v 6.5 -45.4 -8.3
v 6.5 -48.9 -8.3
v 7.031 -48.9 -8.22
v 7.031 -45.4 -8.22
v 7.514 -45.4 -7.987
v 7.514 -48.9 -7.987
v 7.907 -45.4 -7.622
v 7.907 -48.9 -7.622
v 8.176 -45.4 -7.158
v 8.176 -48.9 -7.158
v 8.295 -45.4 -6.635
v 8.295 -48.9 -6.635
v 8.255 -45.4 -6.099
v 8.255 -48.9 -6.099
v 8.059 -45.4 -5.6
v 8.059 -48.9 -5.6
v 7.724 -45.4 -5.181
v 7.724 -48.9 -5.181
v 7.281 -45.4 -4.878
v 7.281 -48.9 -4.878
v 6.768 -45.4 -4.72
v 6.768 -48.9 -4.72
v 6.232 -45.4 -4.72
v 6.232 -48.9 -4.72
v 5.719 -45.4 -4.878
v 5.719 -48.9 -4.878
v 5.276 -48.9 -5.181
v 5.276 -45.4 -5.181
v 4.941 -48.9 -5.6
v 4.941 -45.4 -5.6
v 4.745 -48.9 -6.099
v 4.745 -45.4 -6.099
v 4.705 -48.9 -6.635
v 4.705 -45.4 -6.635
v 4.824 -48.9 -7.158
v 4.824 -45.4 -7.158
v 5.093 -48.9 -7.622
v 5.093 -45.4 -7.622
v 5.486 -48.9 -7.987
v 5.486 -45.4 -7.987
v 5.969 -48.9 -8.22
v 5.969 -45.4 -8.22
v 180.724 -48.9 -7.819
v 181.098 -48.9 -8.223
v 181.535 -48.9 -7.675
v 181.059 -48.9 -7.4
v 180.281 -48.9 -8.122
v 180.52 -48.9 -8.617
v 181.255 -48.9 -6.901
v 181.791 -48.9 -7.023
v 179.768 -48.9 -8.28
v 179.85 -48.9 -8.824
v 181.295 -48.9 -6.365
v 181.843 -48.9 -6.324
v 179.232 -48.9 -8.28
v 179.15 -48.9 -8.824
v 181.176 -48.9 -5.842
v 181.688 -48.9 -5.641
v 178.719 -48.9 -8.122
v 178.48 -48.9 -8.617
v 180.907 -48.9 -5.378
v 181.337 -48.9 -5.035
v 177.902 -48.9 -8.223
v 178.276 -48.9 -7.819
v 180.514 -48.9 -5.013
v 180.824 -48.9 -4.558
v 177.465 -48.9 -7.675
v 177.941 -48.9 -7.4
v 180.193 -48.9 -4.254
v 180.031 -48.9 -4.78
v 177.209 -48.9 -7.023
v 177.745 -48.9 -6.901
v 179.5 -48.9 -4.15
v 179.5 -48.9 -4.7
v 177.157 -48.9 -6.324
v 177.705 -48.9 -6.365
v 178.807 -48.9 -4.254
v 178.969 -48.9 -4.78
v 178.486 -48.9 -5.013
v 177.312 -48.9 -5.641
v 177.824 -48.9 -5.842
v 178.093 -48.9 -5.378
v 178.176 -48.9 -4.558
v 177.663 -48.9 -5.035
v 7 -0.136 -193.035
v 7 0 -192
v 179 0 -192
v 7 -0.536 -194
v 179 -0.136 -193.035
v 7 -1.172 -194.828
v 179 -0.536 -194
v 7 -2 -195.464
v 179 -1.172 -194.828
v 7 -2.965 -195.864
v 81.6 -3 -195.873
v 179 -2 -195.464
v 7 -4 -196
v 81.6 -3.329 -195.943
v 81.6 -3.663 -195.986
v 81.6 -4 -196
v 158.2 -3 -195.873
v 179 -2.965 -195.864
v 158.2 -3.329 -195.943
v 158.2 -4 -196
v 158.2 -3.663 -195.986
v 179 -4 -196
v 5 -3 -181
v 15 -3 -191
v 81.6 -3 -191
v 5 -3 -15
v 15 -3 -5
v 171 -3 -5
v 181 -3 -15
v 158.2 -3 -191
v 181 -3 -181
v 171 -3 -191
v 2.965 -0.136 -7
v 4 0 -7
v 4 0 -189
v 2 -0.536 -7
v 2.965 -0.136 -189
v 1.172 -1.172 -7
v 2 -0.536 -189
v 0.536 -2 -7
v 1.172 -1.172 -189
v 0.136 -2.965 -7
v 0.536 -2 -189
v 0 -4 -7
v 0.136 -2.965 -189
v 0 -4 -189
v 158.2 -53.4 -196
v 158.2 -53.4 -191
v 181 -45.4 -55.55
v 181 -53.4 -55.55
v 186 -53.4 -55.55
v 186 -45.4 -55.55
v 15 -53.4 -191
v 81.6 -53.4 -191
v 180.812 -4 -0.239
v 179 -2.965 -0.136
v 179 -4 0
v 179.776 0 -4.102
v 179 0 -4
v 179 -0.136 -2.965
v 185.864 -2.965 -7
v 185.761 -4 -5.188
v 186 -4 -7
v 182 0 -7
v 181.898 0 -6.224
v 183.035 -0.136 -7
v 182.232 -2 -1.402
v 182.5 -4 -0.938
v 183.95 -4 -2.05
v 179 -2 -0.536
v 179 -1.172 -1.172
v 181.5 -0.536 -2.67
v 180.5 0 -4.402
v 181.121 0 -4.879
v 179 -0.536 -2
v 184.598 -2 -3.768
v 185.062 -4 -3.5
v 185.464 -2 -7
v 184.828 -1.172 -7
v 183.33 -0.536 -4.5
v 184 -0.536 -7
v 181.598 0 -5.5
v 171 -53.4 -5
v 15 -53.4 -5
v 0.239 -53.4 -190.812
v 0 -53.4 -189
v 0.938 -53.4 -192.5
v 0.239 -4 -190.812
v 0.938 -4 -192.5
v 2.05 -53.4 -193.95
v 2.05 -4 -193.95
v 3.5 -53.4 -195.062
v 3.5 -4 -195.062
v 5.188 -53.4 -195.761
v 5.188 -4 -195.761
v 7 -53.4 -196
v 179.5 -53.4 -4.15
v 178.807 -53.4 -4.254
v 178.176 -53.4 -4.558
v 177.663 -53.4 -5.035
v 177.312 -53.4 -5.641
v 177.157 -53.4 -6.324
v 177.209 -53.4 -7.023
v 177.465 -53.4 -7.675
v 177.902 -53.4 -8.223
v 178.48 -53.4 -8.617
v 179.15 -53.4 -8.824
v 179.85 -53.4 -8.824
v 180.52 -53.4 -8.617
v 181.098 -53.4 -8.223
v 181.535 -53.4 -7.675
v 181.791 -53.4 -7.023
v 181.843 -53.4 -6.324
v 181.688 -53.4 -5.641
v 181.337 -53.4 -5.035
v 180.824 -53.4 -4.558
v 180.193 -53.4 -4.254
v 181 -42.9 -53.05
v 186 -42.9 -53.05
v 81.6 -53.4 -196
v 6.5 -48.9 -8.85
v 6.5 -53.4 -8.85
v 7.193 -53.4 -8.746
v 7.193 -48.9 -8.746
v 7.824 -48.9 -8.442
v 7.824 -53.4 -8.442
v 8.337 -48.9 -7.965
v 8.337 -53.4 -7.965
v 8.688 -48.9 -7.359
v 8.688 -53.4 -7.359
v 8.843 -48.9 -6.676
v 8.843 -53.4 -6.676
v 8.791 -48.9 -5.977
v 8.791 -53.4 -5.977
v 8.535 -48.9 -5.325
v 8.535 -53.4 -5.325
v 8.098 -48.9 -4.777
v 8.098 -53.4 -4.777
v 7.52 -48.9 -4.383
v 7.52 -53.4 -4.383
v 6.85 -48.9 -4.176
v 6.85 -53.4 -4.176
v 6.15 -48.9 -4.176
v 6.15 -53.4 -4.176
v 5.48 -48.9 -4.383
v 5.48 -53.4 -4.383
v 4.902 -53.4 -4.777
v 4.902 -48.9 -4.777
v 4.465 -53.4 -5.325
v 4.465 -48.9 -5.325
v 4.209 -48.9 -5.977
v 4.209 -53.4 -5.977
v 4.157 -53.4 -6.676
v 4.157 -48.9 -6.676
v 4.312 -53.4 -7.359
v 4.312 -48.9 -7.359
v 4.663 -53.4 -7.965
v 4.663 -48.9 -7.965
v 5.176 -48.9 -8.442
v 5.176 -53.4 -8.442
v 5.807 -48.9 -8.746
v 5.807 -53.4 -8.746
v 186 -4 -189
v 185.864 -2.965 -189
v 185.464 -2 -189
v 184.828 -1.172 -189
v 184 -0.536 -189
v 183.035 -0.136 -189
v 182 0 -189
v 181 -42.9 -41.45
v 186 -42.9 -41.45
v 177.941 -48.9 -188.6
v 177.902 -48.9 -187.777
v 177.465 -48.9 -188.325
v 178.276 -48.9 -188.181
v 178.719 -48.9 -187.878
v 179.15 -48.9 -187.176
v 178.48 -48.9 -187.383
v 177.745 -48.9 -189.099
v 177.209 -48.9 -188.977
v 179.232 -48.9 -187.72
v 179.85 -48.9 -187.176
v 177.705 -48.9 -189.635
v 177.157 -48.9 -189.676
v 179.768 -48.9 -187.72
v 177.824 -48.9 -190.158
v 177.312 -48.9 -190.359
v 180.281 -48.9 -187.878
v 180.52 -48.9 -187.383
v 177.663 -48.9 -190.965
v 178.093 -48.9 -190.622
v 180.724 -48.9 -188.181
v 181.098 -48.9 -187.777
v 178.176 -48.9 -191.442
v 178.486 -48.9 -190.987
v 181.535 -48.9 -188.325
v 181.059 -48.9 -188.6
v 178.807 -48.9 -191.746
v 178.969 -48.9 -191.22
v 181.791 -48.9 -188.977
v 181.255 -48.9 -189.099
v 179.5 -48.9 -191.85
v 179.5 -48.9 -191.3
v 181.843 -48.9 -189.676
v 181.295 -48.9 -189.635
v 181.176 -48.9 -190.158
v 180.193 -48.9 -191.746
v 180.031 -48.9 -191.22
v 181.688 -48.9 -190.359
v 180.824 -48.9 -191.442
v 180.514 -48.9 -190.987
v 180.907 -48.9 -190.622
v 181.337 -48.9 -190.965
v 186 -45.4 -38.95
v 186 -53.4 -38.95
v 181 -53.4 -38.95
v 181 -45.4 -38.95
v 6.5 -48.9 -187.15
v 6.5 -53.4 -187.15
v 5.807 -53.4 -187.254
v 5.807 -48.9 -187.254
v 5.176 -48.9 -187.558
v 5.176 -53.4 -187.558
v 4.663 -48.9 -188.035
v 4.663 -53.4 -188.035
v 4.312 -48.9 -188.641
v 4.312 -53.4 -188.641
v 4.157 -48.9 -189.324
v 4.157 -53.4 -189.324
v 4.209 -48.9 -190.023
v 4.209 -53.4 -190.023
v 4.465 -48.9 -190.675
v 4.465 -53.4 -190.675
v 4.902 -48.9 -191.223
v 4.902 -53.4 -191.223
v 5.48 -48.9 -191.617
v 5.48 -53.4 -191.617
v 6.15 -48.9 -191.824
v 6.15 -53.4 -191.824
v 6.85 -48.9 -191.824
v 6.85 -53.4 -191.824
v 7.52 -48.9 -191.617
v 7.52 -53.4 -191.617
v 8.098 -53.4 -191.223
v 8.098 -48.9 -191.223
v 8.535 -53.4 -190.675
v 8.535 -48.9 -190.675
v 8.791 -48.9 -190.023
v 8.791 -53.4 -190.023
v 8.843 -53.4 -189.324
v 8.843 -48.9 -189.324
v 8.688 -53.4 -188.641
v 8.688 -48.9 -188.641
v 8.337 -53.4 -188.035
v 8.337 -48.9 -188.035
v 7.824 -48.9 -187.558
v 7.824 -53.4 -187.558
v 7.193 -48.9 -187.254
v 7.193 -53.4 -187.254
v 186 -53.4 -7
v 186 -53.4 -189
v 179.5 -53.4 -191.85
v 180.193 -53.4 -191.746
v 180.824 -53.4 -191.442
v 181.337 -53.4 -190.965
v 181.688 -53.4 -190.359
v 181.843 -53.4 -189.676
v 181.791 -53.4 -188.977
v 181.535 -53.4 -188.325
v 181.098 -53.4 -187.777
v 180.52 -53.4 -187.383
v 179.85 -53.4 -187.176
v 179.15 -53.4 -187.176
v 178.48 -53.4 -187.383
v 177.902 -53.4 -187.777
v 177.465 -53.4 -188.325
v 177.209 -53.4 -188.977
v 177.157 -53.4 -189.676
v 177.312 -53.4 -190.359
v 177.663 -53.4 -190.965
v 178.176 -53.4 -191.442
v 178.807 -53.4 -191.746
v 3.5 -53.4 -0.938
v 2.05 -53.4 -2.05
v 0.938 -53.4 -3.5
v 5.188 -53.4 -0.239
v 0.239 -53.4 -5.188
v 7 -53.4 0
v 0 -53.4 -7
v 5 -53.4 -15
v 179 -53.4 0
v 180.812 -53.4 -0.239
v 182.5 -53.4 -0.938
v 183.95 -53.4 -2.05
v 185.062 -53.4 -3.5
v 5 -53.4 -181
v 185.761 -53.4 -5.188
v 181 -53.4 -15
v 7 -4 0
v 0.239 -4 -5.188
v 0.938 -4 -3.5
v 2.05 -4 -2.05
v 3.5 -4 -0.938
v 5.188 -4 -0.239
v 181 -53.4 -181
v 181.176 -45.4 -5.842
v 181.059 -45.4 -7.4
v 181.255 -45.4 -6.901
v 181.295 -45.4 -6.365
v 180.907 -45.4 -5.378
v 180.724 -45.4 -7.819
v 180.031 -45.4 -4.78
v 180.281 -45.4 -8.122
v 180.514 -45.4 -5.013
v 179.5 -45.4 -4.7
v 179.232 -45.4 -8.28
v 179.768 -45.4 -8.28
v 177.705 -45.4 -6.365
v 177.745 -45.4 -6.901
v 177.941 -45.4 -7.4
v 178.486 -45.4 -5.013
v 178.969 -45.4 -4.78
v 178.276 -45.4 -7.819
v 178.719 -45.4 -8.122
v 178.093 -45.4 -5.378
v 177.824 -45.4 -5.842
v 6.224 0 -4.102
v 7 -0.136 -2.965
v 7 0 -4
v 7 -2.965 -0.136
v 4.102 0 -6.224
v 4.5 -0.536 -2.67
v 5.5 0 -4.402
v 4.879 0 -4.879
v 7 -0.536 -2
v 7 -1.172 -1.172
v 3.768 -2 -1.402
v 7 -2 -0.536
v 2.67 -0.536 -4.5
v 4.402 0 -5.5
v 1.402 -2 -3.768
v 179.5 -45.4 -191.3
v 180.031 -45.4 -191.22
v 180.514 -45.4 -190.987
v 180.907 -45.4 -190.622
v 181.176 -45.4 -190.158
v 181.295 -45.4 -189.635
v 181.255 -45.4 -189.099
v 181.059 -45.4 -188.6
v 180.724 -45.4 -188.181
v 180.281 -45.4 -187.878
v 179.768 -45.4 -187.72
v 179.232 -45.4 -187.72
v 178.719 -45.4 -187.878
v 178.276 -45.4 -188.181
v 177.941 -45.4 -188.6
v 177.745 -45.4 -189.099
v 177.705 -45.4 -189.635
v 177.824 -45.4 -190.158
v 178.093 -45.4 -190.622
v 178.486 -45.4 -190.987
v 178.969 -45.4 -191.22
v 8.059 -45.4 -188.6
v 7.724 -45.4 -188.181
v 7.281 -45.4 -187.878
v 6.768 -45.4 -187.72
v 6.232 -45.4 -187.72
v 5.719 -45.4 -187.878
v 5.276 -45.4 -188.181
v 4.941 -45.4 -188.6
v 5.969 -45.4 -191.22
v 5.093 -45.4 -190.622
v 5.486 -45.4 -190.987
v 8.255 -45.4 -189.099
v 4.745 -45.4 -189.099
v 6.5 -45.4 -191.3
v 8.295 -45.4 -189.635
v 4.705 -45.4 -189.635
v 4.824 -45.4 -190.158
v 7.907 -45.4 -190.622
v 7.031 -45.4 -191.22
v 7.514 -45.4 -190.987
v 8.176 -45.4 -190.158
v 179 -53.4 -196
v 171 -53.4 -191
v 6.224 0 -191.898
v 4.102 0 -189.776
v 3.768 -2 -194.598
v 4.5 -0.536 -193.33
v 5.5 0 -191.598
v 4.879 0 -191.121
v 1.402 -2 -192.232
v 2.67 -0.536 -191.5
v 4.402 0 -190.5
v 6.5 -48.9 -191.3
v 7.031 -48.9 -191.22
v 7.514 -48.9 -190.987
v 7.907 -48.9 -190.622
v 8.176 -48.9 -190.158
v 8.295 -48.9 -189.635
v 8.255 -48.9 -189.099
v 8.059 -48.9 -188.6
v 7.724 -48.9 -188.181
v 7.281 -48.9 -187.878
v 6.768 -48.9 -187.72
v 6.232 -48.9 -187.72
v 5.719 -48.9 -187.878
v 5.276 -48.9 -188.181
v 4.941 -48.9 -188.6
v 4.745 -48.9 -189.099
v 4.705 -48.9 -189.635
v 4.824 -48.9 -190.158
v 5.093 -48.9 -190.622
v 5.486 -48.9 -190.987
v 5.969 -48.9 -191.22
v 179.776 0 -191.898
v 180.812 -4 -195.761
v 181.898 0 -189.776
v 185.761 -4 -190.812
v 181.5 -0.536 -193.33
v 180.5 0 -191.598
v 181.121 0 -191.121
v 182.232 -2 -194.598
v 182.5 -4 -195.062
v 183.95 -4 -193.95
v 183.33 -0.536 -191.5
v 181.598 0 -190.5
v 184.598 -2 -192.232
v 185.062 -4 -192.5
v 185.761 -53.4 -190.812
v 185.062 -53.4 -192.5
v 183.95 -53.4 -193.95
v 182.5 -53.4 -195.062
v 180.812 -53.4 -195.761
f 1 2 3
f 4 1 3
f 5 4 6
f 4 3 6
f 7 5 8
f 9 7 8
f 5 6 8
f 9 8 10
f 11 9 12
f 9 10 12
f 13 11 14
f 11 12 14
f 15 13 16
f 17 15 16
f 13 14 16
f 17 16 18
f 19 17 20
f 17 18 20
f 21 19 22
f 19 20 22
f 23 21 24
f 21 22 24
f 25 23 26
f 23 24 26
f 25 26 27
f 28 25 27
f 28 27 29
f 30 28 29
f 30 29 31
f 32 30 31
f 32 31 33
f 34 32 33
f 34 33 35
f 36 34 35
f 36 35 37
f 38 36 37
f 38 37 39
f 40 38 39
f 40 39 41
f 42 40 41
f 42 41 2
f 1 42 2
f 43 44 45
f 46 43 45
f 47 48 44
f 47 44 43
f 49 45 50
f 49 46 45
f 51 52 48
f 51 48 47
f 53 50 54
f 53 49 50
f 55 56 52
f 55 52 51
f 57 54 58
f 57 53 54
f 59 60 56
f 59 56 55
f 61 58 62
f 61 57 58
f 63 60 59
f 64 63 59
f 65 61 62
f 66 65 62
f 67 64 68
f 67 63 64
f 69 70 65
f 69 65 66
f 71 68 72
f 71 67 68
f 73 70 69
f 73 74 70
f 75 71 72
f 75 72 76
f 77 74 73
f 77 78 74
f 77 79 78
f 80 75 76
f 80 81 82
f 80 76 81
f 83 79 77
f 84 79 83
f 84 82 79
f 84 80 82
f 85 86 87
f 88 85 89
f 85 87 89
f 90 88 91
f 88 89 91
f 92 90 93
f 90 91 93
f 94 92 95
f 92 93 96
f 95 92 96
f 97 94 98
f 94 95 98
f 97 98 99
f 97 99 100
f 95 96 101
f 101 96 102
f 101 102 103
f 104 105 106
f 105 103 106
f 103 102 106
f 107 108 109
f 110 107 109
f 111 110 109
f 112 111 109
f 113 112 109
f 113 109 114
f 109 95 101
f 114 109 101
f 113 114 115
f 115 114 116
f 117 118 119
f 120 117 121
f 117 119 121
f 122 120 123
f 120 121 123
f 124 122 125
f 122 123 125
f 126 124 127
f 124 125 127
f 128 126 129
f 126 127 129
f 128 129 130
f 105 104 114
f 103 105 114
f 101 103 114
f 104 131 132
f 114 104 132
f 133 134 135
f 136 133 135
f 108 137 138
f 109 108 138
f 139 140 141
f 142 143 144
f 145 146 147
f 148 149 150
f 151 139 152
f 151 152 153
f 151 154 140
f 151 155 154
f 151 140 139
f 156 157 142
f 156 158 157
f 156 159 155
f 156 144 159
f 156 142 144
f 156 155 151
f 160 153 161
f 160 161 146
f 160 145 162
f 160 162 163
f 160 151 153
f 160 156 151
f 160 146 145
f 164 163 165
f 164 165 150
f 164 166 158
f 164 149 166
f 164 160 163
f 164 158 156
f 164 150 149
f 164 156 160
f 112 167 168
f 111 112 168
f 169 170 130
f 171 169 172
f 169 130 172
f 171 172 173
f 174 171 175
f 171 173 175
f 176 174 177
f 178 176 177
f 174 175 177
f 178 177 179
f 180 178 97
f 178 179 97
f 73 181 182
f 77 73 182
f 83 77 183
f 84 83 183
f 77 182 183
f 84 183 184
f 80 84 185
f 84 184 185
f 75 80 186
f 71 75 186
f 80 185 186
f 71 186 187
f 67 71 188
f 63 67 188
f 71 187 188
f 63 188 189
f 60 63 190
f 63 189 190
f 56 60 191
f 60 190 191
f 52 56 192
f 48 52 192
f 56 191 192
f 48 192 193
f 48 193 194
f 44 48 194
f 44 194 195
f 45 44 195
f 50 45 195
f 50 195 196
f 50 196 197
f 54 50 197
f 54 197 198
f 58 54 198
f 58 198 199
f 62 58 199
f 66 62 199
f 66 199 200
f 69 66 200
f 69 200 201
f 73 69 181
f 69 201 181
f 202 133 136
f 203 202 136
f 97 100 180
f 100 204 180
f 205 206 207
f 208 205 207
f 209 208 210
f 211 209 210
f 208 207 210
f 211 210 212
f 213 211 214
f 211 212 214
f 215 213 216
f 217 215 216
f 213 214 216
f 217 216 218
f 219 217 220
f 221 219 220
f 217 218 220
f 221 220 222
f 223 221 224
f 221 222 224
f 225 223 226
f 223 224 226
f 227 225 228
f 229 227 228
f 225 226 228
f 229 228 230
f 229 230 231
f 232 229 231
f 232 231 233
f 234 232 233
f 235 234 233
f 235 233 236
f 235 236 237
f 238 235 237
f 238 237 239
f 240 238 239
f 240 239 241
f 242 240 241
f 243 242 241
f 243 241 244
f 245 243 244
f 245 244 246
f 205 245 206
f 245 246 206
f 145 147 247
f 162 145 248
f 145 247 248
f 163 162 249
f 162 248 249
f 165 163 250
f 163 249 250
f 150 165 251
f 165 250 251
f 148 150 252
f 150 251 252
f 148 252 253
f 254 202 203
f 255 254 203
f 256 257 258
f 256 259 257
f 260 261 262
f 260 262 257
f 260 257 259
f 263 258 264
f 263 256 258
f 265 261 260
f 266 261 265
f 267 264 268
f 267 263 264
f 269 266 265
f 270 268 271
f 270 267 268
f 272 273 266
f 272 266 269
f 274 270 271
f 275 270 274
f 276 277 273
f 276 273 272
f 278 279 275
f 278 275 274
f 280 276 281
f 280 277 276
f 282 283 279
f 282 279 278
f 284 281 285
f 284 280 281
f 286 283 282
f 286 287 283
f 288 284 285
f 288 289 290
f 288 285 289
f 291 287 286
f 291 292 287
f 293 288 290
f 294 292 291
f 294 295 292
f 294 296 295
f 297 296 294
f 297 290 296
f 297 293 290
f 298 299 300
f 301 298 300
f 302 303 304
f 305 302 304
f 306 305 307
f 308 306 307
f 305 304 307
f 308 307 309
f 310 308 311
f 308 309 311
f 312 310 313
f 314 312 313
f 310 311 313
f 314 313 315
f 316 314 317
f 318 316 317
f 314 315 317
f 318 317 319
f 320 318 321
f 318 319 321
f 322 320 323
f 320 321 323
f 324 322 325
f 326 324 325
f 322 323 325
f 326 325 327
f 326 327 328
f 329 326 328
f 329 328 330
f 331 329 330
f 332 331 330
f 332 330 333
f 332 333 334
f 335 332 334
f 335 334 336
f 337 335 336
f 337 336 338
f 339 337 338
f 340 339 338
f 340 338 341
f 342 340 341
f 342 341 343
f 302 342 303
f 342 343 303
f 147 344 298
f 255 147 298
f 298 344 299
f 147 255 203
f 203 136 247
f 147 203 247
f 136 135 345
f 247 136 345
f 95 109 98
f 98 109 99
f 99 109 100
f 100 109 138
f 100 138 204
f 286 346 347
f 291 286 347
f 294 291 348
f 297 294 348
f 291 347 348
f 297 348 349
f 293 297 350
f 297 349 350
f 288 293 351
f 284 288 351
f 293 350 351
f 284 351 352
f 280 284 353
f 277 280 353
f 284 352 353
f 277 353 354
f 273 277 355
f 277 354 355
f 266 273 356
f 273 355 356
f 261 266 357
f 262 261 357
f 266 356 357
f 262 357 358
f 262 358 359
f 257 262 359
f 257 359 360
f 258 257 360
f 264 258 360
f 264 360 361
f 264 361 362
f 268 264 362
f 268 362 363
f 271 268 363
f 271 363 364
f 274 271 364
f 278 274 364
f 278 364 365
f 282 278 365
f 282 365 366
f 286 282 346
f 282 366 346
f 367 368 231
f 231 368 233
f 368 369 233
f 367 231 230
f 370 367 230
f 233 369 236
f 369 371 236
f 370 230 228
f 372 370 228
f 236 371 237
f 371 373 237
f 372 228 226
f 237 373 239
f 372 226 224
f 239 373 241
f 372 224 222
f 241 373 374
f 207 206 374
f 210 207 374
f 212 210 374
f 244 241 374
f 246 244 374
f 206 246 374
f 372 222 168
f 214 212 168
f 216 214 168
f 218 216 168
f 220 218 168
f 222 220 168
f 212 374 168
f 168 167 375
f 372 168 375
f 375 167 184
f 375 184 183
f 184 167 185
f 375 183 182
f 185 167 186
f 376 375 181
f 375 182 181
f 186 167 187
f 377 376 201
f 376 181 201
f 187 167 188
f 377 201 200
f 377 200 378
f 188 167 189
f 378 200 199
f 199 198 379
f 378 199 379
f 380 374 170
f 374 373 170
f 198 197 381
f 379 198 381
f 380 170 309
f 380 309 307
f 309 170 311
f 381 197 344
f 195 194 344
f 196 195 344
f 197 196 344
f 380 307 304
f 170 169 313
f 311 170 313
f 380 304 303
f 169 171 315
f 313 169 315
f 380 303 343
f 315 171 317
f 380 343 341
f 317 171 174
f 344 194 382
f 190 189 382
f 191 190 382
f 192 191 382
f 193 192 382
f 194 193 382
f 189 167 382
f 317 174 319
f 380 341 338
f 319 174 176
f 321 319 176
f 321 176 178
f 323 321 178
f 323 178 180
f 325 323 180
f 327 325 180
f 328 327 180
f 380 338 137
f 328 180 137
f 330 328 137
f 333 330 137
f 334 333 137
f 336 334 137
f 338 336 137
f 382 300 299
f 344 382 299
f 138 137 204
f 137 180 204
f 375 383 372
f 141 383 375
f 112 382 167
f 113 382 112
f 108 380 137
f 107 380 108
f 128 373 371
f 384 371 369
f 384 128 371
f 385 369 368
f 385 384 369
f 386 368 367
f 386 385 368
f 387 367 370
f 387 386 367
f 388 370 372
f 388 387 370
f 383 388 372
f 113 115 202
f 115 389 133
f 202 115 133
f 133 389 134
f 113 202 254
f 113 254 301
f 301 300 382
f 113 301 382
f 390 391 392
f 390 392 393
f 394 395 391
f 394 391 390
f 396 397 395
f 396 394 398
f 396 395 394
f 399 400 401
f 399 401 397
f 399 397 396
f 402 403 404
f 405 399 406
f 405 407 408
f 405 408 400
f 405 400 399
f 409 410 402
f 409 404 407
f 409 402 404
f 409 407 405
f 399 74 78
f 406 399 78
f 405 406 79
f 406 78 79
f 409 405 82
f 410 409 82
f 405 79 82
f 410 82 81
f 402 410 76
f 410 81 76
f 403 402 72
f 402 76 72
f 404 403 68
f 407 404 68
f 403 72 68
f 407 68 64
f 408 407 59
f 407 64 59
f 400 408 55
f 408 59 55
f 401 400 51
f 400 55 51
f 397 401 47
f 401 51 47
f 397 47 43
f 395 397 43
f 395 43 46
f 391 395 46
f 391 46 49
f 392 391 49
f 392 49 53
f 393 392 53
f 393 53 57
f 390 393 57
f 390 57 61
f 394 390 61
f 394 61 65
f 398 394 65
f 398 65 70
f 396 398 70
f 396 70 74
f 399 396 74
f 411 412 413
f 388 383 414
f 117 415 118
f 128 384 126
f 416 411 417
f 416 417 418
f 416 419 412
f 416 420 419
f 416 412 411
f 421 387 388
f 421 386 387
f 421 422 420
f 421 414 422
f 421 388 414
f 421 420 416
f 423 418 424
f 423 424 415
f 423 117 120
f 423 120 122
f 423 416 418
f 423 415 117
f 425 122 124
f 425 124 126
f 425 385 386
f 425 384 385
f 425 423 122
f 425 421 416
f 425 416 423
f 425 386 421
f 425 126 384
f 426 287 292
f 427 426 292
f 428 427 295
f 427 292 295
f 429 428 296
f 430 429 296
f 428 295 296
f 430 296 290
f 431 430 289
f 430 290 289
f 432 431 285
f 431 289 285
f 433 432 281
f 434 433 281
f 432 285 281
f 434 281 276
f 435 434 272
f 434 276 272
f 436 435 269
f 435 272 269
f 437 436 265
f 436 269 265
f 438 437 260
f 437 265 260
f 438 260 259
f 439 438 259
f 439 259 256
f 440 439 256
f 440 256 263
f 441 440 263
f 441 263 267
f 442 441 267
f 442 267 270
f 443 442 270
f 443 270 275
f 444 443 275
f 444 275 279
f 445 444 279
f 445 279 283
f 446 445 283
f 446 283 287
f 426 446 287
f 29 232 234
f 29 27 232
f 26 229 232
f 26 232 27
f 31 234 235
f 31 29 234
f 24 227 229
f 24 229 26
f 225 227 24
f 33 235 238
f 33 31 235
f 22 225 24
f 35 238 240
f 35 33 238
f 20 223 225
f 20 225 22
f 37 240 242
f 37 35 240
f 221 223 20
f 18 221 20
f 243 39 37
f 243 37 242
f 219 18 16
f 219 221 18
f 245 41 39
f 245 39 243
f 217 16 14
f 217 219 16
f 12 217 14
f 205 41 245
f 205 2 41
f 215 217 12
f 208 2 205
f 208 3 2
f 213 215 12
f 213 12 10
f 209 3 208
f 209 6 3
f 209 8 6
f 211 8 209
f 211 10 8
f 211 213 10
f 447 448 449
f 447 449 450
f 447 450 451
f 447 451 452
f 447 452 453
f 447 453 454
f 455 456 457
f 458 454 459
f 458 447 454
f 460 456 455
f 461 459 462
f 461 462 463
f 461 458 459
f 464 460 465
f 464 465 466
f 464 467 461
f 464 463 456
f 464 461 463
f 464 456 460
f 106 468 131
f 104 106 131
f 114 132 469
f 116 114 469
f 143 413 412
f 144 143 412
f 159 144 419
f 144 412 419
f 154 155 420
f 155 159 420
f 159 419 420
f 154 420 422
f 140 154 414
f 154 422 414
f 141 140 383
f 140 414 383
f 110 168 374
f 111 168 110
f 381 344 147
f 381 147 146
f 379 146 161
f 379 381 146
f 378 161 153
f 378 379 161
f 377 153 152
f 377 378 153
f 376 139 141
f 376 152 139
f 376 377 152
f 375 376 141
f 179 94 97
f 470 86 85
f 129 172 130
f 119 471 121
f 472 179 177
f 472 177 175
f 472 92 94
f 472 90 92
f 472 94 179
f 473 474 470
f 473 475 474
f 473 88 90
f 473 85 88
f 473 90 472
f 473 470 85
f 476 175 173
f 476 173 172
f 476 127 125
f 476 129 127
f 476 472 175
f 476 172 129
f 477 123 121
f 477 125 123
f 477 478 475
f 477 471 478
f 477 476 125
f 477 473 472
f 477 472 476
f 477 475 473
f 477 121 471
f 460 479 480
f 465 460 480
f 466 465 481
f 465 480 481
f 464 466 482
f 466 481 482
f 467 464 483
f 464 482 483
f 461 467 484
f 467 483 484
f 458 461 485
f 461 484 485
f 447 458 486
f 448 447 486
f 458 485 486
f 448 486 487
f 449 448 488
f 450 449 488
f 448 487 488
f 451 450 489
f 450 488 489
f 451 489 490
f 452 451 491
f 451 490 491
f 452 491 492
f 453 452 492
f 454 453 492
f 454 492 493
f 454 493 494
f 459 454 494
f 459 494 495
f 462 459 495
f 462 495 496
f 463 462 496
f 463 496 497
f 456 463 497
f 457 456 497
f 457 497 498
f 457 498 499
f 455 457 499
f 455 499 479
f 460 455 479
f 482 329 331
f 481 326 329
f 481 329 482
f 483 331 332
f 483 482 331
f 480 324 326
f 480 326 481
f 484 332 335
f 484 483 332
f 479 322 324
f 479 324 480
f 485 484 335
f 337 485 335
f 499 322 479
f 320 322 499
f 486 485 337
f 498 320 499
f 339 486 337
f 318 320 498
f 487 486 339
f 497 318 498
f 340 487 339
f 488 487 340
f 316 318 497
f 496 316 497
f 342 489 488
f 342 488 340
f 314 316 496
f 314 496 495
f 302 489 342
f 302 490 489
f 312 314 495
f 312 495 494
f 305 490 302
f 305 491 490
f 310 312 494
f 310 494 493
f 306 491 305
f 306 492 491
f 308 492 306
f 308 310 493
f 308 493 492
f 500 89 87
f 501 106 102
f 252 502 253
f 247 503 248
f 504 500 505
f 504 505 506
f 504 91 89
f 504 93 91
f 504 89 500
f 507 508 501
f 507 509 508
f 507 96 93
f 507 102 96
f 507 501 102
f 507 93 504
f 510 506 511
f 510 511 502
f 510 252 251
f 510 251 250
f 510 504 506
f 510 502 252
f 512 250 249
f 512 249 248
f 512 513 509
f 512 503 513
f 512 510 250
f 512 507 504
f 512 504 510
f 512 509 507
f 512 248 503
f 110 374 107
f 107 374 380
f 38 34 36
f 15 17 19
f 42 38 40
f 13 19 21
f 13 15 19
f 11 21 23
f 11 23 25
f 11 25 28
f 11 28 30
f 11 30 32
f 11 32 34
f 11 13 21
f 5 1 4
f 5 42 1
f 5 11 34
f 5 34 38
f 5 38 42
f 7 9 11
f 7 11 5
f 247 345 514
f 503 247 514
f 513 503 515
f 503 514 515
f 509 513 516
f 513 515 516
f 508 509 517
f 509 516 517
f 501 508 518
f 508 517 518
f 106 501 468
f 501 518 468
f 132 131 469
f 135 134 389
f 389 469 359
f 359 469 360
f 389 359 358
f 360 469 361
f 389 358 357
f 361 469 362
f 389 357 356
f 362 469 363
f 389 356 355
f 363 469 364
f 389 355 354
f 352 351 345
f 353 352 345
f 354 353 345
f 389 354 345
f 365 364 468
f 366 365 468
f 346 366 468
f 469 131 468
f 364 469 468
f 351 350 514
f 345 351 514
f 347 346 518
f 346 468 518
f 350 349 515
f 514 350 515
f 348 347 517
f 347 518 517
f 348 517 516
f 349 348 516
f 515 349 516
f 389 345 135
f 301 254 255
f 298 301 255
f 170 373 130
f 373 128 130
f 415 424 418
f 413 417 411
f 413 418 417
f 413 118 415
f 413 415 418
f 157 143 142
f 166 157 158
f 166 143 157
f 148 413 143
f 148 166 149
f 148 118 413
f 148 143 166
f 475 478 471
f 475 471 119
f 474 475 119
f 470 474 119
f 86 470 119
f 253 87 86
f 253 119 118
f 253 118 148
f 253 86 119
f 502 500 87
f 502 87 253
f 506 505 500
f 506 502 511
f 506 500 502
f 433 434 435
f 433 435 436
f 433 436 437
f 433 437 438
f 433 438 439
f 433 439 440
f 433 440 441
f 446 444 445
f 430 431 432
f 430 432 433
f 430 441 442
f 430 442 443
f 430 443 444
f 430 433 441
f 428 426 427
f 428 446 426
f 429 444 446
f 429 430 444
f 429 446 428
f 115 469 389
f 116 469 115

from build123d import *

# Parameters (mm, degrees)
SKETCH1_W           = 186
SKETCH1_H           = 196
BOSS_EXTRUDE1_DEPTH = 3
BOSS_EXTRUDE2_START = -53.4
BOSS_EXTRUDE2_DEPTH = 50.4
CHAMFER1_SIZE       = 10
SKETCH1_4_W         = 5
SKETCH1_4_H         = 0.8
SKETCH1_4_H_2       = 15
BOSS_EXTRUDE3_DEPTH = 42.9
CHAMFER2_SIZE       = 2.5
SKETCH2_R           = 2.35
SKETCH2_R_2         = 1.8
CUT_EXTRUDE2_DEPTH  = 4.5
SKETCH2_3_R         = 1.8
CUT_EXTRUDE3_DEPTH  = 8
FILLET1_R           = 7
FILLET2_R           = 4


with BuildPart() as part:
    # Sketch1 → Boss-Extrude1 (new body)
    with BuildSketch(Plane(origin=(0, 0, 0), x_dir=(1, 0, 0), z_dir=(0, 1, 0))):
        with Locations((93, 98)):
            Rectangle(SKETCH1_W, SKETCH1_H)
    extrude(amount=-BOSS_EXTRUDE1_DEPTH)

    # Sketch1<3> → Boss-Extrude2 (add)
    with BuildSketch(Plane(origin=(0, 0, 0), x_dir=(1, 0, 0), z_dir=(0, 1, 0)).offset(BOSS_EXTRUDE2_START)):
        Polygon((186, 196), (158.2, 196), (158.2, 191), (181, 191), (181, 55.55), (186, 55.55), align=None)
        Polygon((81.6, 191), (81.6, 196), (0, 196), (0, 0), (186, 0), (186, 38.95), (181, 38.95), (181, 5), (5, 5), (5, 191), align=None)
    extrude(amount=BOSS_EXTRUDE2_DEPTH)

    # Chamfer1
    chamfer1_edges = [part.edges().sort_by_distance(p)[0] for p in [
        (5, -28.2, -191),
        (5, -28.2, -5),
        (181, -28.2, -5),
        (181, -28.2, -191),
    ]]
    chamfer(chamfer1_edges, length=CHAMFER1_SIZE)

    # Sketch1<4> → Boss-Extrude3 (add)
    with BuildSketch(Plane(origin=(0, 0, 0), x_dir=(1, 0, 0), z_dir=(0, 1, 0))):
        with Locations((183.5, 55.15)):
            Rectangle(SKETCH1_4_W, SKETCH1_4_H)
        with Locations((183.5, 47.25)):
            Rectangle(SKETCH1_4_W, SKETCH1_4_H_2)
        with Locations((183.5, 39.35)):
            Rectangle(SKETCH1_4_W, SKETCH1_4_H)
    extrude(amount=-BOSS_EXTRUDE3_DEPTH)

    # Chamfer2
    chamfer2_edges = [part.edges().sort_by_distance(p)[0] for p in [
        (183.5, -42.9, -55.55),
        (183.5, -42.9, -38.95),
    ]]
    chamfer(chamfer2_edges, length=CHAMFER2_SIZE)

    # Sketch2 → Cut-Extrude2 (cut)
    # profile 1 of 4: a face of its own
    with BuildSketch(Plane.XZ.offset(53.4)):
        with Locations(Location((6.5, -6.5, 0), (0, 0, 270))):
            Circle(SKETCH2_R)
        with Locations(Location((6.5, -6.5, 0), (0, 0, 270))):
            Circle(SKETCH2_R_2, mode=Mode.SUBTRACT)
    # profile 2 of 4: a face of its own
    with BuildSketch(Plane.XZ.offset(53.4)):
        with Locations(Location((179.5, -6.5, 0), (0, 0, 90))):
            Circle(SKETCH2_R)
        with Locations(Location((179.5, -6.5, 0), (0, 0, 90))):
            Circle(SKETCH2_R_2, mode=Mode.SUBTRACT)
    # profile 3 of 4: a face of its own
    with BuildSketch(Plane.XZ.offset(53.4)):
        with Locations(Location((179.5, -189.5, 0), (0, 0, 270))):
            Circle(SKETCH2_R)
        with Locations(Location((179.5, -189.5, 0), (0, 0, 270))):
            Circle(SKETCH2_R_2, mode=Mode.SUBTRACT)
    # profile 4 of 4: a face of its own
    with BuildSketch(Plane.XZ.offset(53.4)):
        with Locations(Location((6.5, -189.5, 0), (0, 0, 90))):
            Circle(SKETCH2_R)
        with Locations(Location((6.5, -189.5, 0), (0, 0, 90))):
            Circle(SKETCH2_R_2, mode=Mode.SUBTRACT)
    extrude(amount=-CUT_EXTRUDE2_DEPTH, mode=Mode.SUBTRACT)

    # Sketch2<3> → Cut-Extrude3 (cut)
    with BuildSketch(Plane.XZ.offset(53.4)):
        with Locations(Location((6.5, -6.5, 0), (0, 0, 270))):
            Circle(SKETCH2_3_R)
        with Locations(Location((6.5, -189.5, 0), (0, 0, 270))):
            Circle(SKETCH2_3_R)
        with Locations(Location((179.5, -189.5, 0), (0, 0, 270))):
            Circle(SKETCH2_3_R)
        with Locations(Location((179.5, -6.5, 0), (0, 0, 90))):
            Circle(SKETCH2_3_R)
    extrude(amount=-CUT_EXTRUDE3_DEPTH, mode=Mode.SUBTRACT)

    # Fillet1
    fillet1_edges = [part.edges().sort_by_distance(p)[0] for p in [
        (0, -26.7, 0),
        (186, -26.7, 0),
        (186, -26.7, -196),
        (0, -26.7, -196),
    ]]
    fillet(fillet1_edges, radius=FILLET1_R)

    # Fillet2
    # the kernel refuses this fillet: 4 mm, written as the material it takes off along each edge
    with BuildSketch(Plane(origin=(179, 0, -7), x_dir=(0, 0, 1), z_dir=(-1, 0, 0))) as fillet2_piece_1:
        with BuildLine():
            CenterArc((7 - FILLET2_R, -FILLET2_R), FILLET2_R, 0, 90)
            Line((7, -FILLET2_R), (7, 0))
            Line((7, 0), (7 - FILLET2_R, 0))
        make_face()
    revolve(axis=Axis((179, 0, -7), (0, 1, 0)), revolution_arc=90, mode=Mode.SUBTRACT)
    with BuildSketch(Plane(origin=(7, 0, 0), x_dir=(0, 0, -1), z_dir=(1, 0, 0))) as fillet2_piece_2:
        with BuildLine():
            CenterArc((FILLET2_R, -FILLET2_R), FILLET2_R, 90, 90)
            Line((0, -FILLET2_R), (0, 0))
            Line((0, 0), (FILLET2_R, 0))
        make_face()
    extrude(amount=172, mode=Mode.SUBTRACT)
    with BuildSketch(Plane(origin=(7, 0, -7), x_dir=(0, 0, 1), z_dir=(1, 0, 0))) as fillet2_piece_3:
        with BuildLine():
            CenterArc((7 - FILLET2_R, FILLET2_R), FILLET2_R, 270, 90)
            Line((7, FILLET2_R), (7, 0))
            Line((7, 0), (7 - FILLET2_R, 0))
        make_face()
    revolve(axis=Axis((7, 0, -7), (0, -1, 0)), revolution_arc=90, mode=Mode.SUBTRACT)
    with BuildSketch(Plane(origin=(0, 0, -189), x_dir=(1, 0, 0), z_dir=(0, 0, 1))) as fillet2_piece_4:
        with BuildLine():
            CenterArc((FILLET2_R, -FILLET2_R), FILLET2_R, 90, 90)
            Line((0, -FILLET2_R), (0, 0))
            Line((0, 0), (FILLET2_R, 0))
        make_face()
    extrude(amount=182, mode=Mode.SUBTRACT)
    with BuildSketch(Plane(origin=(7, 0, -189), x_dir=(0, 0, -1), z_dir=(1, 0, 0))) as fillet2_piece_5:
        with BuildLine():
            CenterArc((7 - FILLET2_R, -FILLET2_R), FILLET2_R, 0, 90)
            Line((7, -FILLET2_R), (7, 0))
            Line((7, 0), (7 - FILLET2_R, 0))
        make_face()
    revolve(axis=Axis((7, 0, -189), (0, 1, 0)), revolution_arc=90, mode=Mode.SUBTRACT)
    with BuildSketch(Plane(origin=(179, 0, -196), x_dir=(0, -1, 0), z_dir=(-1, 0, 0))) as fillet2_piece_6:
        with BuildLine():
            CenterArc((FILLET2_R, FILLET2_R), FILLET2_R, 180, 90)
            Line((0, FILLET2_R), (0, 0))
            Line((0, 0), (FILLET2_R, 0))
        make_face()
    extrude(amount=172, mode=Mode.SUBTRACT)
    with BuildSketch(Plane(origin=(179, 0, -189), x_dir=(0, 0, -1), z_dir=(-1, 0, 0))) as fillet2_piece_7:
        with BuildLine():
            CenterArc((7 - FILLET2_R, FILLET2_R), FILLET2_R, 270, 90)
            Line((7 - FILLET2_R, 0), (7, 0))
            Line((7, 0), (7, FILLET2_R))
        make_face()
    revolve(axis=Axis((179, 0, -189), (0, -1, 0)), revolution_arc=90, mode=Mode.SUBTRACT)
    with BuildSketch(Plane(origin=(186, 0, -189), x_dir=(-1, 0, 0), z_dir=(0, 0, 1))) as fillet2_piece_8:
        with BuildLine():
            CenterArc((FILLET2_R, FILLET2_R), FILLET2_R, 180, 90)
            Line((0, FILLET2_R), (0, 0))
            Line((0, 0), (FILLET2_R, 0))
        make_face()
    extrude(amount=182, mode=Mode.SUBTRACT)


solid = part.part
